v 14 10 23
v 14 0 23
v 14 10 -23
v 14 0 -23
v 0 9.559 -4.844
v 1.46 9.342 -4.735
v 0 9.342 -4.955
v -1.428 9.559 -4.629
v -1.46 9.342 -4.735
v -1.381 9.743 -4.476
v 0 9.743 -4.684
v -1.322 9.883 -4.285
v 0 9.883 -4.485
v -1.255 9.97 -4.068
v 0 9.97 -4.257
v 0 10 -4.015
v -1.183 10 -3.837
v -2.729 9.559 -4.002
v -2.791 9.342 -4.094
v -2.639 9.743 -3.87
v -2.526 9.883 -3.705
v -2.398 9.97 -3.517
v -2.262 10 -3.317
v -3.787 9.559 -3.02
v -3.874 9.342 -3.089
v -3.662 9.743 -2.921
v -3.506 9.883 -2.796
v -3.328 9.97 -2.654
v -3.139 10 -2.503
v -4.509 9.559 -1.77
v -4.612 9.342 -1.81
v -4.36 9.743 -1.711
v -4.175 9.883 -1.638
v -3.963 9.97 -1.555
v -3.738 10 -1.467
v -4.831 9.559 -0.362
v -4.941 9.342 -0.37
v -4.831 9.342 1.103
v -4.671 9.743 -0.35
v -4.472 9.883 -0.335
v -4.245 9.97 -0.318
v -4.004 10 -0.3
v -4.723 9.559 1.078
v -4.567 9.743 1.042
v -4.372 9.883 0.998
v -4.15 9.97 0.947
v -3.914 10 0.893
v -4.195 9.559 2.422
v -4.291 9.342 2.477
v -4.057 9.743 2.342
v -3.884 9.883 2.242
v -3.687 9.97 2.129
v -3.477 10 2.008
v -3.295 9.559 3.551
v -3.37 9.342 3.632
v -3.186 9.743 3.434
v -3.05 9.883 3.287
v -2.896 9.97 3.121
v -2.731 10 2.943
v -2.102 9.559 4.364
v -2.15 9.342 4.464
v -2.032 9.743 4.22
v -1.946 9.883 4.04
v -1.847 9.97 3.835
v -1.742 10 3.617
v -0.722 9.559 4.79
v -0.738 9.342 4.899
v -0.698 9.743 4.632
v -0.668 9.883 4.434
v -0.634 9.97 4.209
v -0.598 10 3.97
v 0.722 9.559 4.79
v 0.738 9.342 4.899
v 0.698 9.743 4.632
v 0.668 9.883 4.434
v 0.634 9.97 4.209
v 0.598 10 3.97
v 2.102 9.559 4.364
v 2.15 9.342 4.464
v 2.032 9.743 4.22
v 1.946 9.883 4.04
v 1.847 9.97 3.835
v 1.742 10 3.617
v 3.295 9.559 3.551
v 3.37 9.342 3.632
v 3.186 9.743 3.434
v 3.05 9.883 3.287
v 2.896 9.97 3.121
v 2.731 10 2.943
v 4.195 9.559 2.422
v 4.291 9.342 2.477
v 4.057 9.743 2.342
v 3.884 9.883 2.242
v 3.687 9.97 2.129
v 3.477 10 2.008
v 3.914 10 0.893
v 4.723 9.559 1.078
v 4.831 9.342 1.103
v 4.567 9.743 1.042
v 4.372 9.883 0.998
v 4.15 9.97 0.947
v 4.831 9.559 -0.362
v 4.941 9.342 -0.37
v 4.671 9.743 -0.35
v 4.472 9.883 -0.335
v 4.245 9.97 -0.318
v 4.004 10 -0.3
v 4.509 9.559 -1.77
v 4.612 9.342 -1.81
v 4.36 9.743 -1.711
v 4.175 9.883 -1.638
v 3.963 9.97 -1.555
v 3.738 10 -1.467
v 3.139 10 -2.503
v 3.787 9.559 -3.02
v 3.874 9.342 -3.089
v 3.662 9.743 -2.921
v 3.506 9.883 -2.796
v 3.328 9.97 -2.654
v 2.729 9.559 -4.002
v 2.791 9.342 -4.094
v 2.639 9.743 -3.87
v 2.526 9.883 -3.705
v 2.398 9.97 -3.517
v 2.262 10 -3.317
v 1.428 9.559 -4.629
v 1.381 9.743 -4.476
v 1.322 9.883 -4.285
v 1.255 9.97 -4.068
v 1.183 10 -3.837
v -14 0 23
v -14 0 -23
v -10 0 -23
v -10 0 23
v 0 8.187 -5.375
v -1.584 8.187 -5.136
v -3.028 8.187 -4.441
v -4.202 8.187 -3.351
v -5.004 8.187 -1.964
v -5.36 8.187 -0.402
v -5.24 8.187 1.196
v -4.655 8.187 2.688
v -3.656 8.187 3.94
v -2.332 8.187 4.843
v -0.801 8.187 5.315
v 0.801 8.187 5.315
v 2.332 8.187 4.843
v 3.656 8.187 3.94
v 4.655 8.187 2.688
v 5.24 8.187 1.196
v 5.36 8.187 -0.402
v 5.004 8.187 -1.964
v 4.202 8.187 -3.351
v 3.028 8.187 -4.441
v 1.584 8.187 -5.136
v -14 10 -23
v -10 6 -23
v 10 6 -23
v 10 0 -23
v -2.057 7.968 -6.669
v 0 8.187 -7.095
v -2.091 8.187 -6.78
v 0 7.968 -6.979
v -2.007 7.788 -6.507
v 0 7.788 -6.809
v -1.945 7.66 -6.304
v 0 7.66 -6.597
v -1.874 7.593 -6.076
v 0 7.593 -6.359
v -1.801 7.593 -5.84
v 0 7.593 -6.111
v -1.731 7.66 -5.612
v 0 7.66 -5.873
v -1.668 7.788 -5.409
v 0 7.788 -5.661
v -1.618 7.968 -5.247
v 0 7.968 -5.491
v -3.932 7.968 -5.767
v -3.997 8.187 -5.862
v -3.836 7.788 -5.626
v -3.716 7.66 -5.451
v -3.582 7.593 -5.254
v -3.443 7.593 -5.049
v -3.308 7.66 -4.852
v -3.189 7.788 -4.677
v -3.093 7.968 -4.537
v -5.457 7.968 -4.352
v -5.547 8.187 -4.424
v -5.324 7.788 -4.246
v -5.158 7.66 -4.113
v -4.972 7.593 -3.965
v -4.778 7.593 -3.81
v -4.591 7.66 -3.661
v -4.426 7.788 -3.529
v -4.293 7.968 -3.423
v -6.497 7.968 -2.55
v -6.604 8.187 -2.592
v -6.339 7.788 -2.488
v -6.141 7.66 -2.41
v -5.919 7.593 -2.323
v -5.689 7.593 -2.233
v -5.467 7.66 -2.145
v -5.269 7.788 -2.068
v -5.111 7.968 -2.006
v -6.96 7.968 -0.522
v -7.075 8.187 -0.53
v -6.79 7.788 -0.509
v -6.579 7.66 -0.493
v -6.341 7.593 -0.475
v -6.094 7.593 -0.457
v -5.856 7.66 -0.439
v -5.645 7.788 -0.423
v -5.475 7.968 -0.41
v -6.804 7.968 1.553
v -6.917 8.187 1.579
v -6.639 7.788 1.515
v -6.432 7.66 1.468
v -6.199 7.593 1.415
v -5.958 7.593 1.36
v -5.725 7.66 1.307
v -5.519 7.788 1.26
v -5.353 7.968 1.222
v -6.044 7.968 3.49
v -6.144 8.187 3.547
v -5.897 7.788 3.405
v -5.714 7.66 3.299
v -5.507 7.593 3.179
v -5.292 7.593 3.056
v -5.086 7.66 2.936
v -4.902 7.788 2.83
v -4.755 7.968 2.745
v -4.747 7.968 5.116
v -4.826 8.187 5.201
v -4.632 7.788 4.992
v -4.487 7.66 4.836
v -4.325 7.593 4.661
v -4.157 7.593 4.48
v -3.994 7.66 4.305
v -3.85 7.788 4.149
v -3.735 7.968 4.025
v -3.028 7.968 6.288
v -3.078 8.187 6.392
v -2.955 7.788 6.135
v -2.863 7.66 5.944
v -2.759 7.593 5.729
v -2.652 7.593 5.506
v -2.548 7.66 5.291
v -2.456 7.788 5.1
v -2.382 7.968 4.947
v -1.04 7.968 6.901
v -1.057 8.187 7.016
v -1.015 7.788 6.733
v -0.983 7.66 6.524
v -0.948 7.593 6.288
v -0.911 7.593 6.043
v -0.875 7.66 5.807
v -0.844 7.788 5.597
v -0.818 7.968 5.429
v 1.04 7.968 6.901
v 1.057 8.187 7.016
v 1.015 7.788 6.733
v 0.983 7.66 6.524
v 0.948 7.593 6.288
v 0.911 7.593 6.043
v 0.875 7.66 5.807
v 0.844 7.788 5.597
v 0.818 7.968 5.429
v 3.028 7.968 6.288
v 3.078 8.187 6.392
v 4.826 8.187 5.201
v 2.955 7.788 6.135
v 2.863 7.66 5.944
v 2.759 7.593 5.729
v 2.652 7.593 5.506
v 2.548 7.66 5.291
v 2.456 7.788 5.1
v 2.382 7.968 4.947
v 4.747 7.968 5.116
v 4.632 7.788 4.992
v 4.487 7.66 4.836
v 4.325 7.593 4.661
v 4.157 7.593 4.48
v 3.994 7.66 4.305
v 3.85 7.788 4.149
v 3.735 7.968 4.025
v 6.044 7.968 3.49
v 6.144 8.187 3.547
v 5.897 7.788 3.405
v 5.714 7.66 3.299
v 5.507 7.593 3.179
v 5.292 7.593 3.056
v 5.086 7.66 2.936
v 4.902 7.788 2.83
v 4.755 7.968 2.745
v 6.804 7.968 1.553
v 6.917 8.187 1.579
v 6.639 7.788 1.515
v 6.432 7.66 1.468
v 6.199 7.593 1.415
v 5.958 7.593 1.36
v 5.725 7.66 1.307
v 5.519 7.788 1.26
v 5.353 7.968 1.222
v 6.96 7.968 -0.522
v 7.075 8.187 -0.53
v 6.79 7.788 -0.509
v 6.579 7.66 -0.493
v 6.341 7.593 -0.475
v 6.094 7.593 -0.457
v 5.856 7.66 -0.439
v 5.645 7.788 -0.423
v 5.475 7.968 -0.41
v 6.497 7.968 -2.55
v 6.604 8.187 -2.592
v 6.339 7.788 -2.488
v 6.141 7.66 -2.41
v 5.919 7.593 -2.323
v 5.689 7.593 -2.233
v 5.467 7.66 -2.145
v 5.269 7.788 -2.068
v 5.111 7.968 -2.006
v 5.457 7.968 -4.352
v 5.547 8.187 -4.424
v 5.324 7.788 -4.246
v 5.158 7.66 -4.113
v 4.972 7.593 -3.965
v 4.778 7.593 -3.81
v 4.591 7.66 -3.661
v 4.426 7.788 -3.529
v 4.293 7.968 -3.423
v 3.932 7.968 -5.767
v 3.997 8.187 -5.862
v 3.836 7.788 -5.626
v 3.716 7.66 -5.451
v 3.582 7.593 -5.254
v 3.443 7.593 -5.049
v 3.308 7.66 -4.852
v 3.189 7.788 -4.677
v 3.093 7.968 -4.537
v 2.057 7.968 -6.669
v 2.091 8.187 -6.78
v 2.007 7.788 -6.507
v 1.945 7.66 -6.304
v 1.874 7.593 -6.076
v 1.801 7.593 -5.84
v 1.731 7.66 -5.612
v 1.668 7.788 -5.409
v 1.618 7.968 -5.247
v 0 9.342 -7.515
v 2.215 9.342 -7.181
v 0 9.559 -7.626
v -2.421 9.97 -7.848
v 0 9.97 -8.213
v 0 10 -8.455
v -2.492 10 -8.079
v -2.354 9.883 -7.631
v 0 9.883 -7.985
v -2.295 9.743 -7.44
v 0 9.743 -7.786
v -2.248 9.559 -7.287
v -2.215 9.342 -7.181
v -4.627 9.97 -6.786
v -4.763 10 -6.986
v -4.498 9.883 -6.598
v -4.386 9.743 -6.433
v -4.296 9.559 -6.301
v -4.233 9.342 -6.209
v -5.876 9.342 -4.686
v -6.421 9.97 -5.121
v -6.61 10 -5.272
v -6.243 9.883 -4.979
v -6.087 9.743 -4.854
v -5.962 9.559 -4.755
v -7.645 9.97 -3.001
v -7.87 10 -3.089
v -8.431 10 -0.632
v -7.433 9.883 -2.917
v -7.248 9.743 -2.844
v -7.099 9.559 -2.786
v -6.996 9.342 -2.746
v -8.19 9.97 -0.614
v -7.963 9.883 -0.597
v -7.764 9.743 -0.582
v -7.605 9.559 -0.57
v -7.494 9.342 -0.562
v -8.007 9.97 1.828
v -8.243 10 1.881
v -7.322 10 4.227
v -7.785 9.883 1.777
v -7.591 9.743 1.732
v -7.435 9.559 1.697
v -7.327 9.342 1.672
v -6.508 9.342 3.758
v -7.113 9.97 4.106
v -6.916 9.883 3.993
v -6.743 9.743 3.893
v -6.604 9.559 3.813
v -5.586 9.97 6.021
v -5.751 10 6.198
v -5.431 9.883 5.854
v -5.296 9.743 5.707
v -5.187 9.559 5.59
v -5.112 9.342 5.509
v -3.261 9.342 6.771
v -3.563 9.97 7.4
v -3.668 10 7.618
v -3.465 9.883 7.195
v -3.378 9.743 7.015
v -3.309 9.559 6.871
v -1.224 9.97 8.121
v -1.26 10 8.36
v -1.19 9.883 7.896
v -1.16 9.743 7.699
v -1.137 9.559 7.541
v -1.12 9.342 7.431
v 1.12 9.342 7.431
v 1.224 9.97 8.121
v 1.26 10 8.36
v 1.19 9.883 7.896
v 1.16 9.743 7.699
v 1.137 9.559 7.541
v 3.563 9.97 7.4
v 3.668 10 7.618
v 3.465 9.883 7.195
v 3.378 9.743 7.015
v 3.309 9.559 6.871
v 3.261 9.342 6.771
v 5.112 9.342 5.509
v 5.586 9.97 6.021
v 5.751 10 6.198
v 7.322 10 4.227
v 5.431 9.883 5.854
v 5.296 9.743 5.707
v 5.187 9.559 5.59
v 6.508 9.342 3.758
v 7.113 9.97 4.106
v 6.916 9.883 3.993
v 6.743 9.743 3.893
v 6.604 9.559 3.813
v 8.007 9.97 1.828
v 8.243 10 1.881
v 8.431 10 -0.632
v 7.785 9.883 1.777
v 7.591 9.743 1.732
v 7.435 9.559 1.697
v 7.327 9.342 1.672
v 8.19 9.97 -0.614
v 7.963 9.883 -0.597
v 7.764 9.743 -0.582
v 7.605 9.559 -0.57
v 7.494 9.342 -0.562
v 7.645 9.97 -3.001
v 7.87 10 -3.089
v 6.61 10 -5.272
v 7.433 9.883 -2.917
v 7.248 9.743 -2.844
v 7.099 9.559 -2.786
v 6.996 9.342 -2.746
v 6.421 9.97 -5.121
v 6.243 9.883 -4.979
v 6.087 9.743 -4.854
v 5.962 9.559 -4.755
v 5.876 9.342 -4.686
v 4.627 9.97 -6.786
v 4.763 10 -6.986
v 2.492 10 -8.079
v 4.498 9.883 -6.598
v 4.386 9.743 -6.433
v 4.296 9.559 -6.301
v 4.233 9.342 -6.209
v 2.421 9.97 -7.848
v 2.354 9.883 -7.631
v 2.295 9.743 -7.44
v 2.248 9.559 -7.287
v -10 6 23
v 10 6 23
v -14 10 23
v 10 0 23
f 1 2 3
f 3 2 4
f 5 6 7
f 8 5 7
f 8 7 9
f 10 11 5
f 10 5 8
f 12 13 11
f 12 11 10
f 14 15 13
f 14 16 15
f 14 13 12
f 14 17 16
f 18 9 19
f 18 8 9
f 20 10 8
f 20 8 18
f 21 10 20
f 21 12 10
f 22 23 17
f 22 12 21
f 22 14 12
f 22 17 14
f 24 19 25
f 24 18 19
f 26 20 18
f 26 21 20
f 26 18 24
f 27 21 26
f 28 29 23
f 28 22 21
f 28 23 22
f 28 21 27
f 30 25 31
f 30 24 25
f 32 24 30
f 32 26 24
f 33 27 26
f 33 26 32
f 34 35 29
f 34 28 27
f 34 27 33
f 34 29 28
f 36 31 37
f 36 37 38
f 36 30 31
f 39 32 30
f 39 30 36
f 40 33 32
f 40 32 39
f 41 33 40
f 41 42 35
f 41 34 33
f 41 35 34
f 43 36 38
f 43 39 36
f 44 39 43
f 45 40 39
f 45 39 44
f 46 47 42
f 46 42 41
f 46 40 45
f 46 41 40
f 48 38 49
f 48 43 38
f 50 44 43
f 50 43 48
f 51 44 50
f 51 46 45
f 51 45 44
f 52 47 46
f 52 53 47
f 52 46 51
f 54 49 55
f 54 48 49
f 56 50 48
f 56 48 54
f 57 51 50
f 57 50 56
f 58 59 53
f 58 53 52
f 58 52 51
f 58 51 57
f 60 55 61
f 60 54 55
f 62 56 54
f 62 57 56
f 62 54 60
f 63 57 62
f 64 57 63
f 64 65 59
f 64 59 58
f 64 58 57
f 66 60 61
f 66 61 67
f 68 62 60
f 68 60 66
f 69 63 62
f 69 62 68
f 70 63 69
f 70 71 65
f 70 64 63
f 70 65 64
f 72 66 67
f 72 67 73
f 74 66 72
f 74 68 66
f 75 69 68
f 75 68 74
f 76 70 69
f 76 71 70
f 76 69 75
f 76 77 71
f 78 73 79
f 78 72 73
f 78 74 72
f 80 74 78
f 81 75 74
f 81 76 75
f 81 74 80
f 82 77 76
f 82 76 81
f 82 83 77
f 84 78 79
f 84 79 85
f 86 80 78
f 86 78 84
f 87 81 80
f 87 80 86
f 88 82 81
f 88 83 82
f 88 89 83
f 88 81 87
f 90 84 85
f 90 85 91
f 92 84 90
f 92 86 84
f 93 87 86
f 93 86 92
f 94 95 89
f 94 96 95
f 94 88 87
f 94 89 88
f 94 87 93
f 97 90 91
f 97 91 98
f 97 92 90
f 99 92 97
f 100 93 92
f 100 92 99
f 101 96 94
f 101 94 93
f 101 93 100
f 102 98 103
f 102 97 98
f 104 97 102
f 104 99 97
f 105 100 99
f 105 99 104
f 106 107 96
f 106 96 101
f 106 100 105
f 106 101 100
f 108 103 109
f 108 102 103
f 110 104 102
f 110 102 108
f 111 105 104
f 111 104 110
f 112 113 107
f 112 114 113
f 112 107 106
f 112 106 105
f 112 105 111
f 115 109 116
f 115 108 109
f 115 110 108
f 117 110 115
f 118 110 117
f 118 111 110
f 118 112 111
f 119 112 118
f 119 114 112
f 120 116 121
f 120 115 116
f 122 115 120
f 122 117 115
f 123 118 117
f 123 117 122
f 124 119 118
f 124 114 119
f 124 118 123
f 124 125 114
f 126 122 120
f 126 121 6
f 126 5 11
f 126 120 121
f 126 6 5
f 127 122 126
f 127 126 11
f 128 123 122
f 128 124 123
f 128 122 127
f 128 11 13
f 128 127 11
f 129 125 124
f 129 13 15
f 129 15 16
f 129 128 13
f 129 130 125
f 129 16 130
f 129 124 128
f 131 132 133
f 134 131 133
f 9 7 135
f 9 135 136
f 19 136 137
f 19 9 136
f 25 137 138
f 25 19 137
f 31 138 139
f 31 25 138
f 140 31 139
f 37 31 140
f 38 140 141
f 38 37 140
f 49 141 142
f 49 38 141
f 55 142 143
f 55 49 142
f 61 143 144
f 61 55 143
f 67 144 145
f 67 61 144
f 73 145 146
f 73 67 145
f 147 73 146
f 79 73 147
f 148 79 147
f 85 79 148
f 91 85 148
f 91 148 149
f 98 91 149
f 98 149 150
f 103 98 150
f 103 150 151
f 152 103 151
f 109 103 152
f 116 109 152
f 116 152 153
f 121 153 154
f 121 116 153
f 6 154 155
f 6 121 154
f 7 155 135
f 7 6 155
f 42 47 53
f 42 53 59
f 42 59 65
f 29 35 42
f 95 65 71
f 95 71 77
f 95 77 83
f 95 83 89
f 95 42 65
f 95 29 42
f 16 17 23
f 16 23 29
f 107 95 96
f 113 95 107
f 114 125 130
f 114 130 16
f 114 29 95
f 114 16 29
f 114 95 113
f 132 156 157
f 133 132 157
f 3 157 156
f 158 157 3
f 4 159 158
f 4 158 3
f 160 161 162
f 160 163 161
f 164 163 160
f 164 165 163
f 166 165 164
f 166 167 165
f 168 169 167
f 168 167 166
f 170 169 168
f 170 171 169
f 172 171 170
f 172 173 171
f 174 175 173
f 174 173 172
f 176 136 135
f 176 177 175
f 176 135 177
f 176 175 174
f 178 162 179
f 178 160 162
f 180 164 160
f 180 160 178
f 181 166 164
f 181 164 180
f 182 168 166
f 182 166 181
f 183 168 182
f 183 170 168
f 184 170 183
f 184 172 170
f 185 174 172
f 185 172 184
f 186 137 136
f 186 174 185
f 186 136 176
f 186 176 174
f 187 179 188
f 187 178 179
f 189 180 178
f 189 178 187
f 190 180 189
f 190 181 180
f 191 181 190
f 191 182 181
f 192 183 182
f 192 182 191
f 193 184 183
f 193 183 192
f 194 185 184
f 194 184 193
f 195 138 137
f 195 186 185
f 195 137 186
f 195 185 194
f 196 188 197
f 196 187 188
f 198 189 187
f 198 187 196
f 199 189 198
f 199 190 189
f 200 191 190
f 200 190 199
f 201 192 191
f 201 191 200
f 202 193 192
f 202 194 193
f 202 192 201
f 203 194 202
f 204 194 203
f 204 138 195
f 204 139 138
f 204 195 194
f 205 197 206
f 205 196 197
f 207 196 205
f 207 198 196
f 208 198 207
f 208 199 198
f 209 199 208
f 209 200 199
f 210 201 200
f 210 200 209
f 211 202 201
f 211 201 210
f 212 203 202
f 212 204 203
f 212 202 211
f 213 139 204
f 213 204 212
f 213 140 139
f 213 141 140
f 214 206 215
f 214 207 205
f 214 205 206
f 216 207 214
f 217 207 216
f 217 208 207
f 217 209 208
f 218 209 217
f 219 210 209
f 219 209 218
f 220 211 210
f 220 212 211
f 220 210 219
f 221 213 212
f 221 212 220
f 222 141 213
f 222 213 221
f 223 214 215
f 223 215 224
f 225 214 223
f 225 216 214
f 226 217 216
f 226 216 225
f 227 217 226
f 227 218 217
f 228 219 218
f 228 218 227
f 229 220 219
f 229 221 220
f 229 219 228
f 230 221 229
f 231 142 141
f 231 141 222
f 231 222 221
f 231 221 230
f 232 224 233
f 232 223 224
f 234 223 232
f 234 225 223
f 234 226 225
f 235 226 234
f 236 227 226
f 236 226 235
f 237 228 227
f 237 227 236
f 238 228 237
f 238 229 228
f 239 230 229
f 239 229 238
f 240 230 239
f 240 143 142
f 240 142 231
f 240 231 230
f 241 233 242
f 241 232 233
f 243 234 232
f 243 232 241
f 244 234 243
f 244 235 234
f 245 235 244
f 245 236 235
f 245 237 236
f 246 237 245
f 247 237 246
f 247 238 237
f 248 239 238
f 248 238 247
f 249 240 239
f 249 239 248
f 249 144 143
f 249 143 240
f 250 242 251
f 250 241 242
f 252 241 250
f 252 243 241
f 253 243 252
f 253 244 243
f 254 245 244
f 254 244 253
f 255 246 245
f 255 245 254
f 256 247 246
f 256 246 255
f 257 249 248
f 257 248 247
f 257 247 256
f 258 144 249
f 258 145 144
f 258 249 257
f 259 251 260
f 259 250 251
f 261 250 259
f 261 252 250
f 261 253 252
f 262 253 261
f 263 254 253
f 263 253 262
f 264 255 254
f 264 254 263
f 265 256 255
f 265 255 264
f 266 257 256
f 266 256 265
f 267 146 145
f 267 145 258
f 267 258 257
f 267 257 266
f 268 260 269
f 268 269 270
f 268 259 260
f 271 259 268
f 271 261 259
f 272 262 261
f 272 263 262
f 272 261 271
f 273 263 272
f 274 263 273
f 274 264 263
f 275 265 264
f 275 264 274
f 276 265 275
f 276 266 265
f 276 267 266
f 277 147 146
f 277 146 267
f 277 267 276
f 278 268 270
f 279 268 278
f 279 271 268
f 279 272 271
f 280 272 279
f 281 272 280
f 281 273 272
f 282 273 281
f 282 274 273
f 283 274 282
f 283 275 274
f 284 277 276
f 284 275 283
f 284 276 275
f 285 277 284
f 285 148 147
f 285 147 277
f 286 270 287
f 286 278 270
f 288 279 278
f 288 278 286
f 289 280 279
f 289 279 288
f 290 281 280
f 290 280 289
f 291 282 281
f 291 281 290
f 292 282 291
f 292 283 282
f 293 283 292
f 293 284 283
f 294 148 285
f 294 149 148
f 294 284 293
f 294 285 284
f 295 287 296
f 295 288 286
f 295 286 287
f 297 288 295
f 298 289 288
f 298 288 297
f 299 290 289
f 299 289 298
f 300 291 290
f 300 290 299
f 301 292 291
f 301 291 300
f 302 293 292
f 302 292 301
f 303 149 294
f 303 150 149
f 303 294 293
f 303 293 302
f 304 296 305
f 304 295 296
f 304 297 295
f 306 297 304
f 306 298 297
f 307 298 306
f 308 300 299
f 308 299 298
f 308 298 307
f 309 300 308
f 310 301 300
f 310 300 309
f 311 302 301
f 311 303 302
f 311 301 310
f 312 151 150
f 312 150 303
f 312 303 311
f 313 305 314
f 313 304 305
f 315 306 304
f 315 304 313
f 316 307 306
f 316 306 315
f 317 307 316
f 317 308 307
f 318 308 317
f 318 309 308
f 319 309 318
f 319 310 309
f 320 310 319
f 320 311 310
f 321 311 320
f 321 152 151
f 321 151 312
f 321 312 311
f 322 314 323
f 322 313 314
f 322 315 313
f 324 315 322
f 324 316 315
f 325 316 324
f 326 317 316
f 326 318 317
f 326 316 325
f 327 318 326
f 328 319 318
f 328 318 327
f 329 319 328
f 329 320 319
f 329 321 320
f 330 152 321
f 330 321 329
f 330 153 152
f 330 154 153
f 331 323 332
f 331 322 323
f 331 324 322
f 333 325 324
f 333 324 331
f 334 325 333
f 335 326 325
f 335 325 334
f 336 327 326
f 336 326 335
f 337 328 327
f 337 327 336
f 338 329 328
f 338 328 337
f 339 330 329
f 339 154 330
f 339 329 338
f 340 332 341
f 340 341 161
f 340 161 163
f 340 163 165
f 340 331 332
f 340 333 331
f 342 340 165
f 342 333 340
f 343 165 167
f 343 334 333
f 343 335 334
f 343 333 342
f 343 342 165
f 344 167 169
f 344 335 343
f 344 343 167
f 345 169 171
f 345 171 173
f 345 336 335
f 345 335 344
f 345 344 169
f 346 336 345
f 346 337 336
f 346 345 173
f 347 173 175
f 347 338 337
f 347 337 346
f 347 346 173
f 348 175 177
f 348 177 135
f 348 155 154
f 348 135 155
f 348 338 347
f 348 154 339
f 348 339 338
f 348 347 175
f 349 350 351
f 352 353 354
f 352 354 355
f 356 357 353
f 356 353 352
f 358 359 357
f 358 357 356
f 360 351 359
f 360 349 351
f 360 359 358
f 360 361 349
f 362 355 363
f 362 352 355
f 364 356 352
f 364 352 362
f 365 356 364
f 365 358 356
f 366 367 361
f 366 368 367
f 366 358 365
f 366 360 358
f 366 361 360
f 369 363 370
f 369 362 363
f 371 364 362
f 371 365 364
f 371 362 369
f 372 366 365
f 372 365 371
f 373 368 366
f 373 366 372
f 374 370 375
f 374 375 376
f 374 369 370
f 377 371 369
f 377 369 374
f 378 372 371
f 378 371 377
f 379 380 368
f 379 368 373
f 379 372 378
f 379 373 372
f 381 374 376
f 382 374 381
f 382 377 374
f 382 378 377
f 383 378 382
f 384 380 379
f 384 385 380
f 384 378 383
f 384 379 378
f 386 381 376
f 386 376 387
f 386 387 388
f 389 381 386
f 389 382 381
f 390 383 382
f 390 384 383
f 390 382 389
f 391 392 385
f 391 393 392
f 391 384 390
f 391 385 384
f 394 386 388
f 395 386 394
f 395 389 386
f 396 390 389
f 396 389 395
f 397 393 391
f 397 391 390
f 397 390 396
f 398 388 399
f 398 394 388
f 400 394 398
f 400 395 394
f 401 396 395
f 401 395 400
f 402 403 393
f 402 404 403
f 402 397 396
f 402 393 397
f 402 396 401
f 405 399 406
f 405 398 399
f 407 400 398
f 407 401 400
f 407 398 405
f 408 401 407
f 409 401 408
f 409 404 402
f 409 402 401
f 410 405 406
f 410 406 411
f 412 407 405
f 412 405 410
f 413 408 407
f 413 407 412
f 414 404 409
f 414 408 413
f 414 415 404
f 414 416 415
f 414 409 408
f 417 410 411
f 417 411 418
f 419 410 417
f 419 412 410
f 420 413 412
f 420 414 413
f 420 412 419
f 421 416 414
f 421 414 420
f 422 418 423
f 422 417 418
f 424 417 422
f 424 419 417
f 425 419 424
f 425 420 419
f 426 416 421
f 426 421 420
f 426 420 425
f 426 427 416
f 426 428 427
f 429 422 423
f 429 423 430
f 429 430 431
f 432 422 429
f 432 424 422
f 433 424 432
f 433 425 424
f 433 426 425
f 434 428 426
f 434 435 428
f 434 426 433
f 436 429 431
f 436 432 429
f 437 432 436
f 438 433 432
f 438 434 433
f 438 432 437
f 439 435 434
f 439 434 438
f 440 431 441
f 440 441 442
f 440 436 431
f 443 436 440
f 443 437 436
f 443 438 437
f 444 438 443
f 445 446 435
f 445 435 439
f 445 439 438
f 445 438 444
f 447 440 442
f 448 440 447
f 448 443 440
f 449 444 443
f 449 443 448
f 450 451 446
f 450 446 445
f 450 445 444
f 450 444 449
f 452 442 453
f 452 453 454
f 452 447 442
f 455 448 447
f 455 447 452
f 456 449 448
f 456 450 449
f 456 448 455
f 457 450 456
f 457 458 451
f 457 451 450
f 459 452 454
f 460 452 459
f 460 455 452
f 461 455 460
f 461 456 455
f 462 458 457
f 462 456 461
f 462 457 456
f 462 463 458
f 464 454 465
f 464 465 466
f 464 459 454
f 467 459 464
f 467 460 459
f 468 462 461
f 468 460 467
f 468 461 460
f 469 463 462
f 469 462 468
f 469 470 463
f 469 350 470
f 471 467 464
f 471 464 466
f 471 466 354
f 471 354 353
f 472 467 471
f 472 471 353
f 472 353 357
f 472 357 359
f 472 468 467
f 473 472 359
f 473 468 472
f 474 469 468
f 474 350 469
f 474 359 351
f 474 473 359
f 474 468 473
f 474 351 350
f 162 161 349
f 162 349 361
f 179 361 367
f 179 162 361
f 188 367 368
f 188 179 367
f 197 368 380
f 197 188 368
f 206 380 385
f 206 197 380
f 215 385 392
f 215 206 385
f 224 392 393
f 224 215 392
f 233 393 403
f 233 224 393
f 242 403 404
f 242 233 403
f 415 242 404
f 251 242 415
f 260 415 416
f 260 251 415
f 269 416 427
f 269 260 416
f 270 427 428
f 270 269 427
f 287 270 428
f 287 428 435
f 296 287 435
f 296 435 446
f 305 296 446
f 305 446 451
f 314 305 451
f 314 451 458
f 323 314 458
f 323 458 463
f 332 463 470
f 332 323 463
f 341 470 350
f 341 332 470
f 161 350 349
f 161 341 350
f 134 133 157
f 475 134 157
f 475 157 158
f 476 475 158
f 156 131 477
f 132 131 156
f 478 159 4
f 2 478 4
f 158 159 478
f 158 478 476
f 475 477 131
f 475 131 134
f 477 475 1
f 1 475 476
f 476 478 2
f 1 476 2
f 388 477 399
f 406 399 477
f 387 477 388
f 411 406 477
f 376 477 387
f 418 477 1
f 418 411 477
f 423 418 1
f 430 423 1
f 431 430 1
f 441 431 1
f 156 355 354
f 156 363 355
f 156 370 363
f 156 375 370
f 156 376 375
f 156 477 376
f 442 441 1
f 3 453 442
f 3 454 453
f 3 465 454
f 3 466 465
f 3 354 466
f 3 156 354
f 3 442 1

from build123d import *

# Parameters (mm, degrees)
SKETCH1_W           = 28
SKETCH1_H           = 46
BOSS_EXTRUDE1_DEPTH = 10
SKETCH2_W           = 20
SKETCH2_H           = 6
CUT_EXTRUDE1_DEPTH  = 50.112116631
FILLET3_R           = 1


with BuildPart() as part:
    # Sketch1 → Boss-Extrude1 (new body)
    with BuildSketch(Plane(origin=(0, 0, 0), x_dir=(1, 0, 0), z_dir=(0, 1, 0))):
        Rectangle(SKETCH1_W, SKETCH1_H)
    extrude(amount=BOSS_EXTRUDE1_DEPTH)

    # Sketch2 → Cut-Extrude1 (cut, through all)
    with BuildSketch(Plane.XY.offset(23)):
        with Locations((0, 3)):
            Rectangle(SKETCH2_W, SKETCH2_H)
    extrude(amount=-CUT_EXTRUDE1_DEPTH, mode=Mode.SUBTRACT)

    # Sketch3 → Cut-Revolve1 (revolve, cut)
    with BuildSketch(Plane.XY, mode=Mode.PRIVATE) as cut_revolve1_sk:
        with BuildLine():
            Line((5.375181252, 8.187051569), (4.715321987, 10))
            Line((4.715321987, 10), (7.754678013, 10))
            Line((7.754678013, 10), (7.094818748, 8.187051569))
            ThreePointArc((7.094818748, 8.187051569), (6.235, 7.585), (5.375181252, 8.187051569))
        make_face()
    revolve(cut_revolve1_sk.sketch.rotate(Axis((0, -1000.11801834, 0), (0, 1, 0)), 90), axis=Axis((0, -1000.11801834, 0), (0, 1, 0)), mode=Mode.SUBTRACT)

    # Fillet3
    fillet3_edges = [part.edges().sort_by_distance(p)[0] for p in [
        (0, 10, 7.754678013),
        (0, 10, 4.715321987),
    ]]
    fillet(fillet3_edges, radius=FILLET3_R)


solid = part.part
